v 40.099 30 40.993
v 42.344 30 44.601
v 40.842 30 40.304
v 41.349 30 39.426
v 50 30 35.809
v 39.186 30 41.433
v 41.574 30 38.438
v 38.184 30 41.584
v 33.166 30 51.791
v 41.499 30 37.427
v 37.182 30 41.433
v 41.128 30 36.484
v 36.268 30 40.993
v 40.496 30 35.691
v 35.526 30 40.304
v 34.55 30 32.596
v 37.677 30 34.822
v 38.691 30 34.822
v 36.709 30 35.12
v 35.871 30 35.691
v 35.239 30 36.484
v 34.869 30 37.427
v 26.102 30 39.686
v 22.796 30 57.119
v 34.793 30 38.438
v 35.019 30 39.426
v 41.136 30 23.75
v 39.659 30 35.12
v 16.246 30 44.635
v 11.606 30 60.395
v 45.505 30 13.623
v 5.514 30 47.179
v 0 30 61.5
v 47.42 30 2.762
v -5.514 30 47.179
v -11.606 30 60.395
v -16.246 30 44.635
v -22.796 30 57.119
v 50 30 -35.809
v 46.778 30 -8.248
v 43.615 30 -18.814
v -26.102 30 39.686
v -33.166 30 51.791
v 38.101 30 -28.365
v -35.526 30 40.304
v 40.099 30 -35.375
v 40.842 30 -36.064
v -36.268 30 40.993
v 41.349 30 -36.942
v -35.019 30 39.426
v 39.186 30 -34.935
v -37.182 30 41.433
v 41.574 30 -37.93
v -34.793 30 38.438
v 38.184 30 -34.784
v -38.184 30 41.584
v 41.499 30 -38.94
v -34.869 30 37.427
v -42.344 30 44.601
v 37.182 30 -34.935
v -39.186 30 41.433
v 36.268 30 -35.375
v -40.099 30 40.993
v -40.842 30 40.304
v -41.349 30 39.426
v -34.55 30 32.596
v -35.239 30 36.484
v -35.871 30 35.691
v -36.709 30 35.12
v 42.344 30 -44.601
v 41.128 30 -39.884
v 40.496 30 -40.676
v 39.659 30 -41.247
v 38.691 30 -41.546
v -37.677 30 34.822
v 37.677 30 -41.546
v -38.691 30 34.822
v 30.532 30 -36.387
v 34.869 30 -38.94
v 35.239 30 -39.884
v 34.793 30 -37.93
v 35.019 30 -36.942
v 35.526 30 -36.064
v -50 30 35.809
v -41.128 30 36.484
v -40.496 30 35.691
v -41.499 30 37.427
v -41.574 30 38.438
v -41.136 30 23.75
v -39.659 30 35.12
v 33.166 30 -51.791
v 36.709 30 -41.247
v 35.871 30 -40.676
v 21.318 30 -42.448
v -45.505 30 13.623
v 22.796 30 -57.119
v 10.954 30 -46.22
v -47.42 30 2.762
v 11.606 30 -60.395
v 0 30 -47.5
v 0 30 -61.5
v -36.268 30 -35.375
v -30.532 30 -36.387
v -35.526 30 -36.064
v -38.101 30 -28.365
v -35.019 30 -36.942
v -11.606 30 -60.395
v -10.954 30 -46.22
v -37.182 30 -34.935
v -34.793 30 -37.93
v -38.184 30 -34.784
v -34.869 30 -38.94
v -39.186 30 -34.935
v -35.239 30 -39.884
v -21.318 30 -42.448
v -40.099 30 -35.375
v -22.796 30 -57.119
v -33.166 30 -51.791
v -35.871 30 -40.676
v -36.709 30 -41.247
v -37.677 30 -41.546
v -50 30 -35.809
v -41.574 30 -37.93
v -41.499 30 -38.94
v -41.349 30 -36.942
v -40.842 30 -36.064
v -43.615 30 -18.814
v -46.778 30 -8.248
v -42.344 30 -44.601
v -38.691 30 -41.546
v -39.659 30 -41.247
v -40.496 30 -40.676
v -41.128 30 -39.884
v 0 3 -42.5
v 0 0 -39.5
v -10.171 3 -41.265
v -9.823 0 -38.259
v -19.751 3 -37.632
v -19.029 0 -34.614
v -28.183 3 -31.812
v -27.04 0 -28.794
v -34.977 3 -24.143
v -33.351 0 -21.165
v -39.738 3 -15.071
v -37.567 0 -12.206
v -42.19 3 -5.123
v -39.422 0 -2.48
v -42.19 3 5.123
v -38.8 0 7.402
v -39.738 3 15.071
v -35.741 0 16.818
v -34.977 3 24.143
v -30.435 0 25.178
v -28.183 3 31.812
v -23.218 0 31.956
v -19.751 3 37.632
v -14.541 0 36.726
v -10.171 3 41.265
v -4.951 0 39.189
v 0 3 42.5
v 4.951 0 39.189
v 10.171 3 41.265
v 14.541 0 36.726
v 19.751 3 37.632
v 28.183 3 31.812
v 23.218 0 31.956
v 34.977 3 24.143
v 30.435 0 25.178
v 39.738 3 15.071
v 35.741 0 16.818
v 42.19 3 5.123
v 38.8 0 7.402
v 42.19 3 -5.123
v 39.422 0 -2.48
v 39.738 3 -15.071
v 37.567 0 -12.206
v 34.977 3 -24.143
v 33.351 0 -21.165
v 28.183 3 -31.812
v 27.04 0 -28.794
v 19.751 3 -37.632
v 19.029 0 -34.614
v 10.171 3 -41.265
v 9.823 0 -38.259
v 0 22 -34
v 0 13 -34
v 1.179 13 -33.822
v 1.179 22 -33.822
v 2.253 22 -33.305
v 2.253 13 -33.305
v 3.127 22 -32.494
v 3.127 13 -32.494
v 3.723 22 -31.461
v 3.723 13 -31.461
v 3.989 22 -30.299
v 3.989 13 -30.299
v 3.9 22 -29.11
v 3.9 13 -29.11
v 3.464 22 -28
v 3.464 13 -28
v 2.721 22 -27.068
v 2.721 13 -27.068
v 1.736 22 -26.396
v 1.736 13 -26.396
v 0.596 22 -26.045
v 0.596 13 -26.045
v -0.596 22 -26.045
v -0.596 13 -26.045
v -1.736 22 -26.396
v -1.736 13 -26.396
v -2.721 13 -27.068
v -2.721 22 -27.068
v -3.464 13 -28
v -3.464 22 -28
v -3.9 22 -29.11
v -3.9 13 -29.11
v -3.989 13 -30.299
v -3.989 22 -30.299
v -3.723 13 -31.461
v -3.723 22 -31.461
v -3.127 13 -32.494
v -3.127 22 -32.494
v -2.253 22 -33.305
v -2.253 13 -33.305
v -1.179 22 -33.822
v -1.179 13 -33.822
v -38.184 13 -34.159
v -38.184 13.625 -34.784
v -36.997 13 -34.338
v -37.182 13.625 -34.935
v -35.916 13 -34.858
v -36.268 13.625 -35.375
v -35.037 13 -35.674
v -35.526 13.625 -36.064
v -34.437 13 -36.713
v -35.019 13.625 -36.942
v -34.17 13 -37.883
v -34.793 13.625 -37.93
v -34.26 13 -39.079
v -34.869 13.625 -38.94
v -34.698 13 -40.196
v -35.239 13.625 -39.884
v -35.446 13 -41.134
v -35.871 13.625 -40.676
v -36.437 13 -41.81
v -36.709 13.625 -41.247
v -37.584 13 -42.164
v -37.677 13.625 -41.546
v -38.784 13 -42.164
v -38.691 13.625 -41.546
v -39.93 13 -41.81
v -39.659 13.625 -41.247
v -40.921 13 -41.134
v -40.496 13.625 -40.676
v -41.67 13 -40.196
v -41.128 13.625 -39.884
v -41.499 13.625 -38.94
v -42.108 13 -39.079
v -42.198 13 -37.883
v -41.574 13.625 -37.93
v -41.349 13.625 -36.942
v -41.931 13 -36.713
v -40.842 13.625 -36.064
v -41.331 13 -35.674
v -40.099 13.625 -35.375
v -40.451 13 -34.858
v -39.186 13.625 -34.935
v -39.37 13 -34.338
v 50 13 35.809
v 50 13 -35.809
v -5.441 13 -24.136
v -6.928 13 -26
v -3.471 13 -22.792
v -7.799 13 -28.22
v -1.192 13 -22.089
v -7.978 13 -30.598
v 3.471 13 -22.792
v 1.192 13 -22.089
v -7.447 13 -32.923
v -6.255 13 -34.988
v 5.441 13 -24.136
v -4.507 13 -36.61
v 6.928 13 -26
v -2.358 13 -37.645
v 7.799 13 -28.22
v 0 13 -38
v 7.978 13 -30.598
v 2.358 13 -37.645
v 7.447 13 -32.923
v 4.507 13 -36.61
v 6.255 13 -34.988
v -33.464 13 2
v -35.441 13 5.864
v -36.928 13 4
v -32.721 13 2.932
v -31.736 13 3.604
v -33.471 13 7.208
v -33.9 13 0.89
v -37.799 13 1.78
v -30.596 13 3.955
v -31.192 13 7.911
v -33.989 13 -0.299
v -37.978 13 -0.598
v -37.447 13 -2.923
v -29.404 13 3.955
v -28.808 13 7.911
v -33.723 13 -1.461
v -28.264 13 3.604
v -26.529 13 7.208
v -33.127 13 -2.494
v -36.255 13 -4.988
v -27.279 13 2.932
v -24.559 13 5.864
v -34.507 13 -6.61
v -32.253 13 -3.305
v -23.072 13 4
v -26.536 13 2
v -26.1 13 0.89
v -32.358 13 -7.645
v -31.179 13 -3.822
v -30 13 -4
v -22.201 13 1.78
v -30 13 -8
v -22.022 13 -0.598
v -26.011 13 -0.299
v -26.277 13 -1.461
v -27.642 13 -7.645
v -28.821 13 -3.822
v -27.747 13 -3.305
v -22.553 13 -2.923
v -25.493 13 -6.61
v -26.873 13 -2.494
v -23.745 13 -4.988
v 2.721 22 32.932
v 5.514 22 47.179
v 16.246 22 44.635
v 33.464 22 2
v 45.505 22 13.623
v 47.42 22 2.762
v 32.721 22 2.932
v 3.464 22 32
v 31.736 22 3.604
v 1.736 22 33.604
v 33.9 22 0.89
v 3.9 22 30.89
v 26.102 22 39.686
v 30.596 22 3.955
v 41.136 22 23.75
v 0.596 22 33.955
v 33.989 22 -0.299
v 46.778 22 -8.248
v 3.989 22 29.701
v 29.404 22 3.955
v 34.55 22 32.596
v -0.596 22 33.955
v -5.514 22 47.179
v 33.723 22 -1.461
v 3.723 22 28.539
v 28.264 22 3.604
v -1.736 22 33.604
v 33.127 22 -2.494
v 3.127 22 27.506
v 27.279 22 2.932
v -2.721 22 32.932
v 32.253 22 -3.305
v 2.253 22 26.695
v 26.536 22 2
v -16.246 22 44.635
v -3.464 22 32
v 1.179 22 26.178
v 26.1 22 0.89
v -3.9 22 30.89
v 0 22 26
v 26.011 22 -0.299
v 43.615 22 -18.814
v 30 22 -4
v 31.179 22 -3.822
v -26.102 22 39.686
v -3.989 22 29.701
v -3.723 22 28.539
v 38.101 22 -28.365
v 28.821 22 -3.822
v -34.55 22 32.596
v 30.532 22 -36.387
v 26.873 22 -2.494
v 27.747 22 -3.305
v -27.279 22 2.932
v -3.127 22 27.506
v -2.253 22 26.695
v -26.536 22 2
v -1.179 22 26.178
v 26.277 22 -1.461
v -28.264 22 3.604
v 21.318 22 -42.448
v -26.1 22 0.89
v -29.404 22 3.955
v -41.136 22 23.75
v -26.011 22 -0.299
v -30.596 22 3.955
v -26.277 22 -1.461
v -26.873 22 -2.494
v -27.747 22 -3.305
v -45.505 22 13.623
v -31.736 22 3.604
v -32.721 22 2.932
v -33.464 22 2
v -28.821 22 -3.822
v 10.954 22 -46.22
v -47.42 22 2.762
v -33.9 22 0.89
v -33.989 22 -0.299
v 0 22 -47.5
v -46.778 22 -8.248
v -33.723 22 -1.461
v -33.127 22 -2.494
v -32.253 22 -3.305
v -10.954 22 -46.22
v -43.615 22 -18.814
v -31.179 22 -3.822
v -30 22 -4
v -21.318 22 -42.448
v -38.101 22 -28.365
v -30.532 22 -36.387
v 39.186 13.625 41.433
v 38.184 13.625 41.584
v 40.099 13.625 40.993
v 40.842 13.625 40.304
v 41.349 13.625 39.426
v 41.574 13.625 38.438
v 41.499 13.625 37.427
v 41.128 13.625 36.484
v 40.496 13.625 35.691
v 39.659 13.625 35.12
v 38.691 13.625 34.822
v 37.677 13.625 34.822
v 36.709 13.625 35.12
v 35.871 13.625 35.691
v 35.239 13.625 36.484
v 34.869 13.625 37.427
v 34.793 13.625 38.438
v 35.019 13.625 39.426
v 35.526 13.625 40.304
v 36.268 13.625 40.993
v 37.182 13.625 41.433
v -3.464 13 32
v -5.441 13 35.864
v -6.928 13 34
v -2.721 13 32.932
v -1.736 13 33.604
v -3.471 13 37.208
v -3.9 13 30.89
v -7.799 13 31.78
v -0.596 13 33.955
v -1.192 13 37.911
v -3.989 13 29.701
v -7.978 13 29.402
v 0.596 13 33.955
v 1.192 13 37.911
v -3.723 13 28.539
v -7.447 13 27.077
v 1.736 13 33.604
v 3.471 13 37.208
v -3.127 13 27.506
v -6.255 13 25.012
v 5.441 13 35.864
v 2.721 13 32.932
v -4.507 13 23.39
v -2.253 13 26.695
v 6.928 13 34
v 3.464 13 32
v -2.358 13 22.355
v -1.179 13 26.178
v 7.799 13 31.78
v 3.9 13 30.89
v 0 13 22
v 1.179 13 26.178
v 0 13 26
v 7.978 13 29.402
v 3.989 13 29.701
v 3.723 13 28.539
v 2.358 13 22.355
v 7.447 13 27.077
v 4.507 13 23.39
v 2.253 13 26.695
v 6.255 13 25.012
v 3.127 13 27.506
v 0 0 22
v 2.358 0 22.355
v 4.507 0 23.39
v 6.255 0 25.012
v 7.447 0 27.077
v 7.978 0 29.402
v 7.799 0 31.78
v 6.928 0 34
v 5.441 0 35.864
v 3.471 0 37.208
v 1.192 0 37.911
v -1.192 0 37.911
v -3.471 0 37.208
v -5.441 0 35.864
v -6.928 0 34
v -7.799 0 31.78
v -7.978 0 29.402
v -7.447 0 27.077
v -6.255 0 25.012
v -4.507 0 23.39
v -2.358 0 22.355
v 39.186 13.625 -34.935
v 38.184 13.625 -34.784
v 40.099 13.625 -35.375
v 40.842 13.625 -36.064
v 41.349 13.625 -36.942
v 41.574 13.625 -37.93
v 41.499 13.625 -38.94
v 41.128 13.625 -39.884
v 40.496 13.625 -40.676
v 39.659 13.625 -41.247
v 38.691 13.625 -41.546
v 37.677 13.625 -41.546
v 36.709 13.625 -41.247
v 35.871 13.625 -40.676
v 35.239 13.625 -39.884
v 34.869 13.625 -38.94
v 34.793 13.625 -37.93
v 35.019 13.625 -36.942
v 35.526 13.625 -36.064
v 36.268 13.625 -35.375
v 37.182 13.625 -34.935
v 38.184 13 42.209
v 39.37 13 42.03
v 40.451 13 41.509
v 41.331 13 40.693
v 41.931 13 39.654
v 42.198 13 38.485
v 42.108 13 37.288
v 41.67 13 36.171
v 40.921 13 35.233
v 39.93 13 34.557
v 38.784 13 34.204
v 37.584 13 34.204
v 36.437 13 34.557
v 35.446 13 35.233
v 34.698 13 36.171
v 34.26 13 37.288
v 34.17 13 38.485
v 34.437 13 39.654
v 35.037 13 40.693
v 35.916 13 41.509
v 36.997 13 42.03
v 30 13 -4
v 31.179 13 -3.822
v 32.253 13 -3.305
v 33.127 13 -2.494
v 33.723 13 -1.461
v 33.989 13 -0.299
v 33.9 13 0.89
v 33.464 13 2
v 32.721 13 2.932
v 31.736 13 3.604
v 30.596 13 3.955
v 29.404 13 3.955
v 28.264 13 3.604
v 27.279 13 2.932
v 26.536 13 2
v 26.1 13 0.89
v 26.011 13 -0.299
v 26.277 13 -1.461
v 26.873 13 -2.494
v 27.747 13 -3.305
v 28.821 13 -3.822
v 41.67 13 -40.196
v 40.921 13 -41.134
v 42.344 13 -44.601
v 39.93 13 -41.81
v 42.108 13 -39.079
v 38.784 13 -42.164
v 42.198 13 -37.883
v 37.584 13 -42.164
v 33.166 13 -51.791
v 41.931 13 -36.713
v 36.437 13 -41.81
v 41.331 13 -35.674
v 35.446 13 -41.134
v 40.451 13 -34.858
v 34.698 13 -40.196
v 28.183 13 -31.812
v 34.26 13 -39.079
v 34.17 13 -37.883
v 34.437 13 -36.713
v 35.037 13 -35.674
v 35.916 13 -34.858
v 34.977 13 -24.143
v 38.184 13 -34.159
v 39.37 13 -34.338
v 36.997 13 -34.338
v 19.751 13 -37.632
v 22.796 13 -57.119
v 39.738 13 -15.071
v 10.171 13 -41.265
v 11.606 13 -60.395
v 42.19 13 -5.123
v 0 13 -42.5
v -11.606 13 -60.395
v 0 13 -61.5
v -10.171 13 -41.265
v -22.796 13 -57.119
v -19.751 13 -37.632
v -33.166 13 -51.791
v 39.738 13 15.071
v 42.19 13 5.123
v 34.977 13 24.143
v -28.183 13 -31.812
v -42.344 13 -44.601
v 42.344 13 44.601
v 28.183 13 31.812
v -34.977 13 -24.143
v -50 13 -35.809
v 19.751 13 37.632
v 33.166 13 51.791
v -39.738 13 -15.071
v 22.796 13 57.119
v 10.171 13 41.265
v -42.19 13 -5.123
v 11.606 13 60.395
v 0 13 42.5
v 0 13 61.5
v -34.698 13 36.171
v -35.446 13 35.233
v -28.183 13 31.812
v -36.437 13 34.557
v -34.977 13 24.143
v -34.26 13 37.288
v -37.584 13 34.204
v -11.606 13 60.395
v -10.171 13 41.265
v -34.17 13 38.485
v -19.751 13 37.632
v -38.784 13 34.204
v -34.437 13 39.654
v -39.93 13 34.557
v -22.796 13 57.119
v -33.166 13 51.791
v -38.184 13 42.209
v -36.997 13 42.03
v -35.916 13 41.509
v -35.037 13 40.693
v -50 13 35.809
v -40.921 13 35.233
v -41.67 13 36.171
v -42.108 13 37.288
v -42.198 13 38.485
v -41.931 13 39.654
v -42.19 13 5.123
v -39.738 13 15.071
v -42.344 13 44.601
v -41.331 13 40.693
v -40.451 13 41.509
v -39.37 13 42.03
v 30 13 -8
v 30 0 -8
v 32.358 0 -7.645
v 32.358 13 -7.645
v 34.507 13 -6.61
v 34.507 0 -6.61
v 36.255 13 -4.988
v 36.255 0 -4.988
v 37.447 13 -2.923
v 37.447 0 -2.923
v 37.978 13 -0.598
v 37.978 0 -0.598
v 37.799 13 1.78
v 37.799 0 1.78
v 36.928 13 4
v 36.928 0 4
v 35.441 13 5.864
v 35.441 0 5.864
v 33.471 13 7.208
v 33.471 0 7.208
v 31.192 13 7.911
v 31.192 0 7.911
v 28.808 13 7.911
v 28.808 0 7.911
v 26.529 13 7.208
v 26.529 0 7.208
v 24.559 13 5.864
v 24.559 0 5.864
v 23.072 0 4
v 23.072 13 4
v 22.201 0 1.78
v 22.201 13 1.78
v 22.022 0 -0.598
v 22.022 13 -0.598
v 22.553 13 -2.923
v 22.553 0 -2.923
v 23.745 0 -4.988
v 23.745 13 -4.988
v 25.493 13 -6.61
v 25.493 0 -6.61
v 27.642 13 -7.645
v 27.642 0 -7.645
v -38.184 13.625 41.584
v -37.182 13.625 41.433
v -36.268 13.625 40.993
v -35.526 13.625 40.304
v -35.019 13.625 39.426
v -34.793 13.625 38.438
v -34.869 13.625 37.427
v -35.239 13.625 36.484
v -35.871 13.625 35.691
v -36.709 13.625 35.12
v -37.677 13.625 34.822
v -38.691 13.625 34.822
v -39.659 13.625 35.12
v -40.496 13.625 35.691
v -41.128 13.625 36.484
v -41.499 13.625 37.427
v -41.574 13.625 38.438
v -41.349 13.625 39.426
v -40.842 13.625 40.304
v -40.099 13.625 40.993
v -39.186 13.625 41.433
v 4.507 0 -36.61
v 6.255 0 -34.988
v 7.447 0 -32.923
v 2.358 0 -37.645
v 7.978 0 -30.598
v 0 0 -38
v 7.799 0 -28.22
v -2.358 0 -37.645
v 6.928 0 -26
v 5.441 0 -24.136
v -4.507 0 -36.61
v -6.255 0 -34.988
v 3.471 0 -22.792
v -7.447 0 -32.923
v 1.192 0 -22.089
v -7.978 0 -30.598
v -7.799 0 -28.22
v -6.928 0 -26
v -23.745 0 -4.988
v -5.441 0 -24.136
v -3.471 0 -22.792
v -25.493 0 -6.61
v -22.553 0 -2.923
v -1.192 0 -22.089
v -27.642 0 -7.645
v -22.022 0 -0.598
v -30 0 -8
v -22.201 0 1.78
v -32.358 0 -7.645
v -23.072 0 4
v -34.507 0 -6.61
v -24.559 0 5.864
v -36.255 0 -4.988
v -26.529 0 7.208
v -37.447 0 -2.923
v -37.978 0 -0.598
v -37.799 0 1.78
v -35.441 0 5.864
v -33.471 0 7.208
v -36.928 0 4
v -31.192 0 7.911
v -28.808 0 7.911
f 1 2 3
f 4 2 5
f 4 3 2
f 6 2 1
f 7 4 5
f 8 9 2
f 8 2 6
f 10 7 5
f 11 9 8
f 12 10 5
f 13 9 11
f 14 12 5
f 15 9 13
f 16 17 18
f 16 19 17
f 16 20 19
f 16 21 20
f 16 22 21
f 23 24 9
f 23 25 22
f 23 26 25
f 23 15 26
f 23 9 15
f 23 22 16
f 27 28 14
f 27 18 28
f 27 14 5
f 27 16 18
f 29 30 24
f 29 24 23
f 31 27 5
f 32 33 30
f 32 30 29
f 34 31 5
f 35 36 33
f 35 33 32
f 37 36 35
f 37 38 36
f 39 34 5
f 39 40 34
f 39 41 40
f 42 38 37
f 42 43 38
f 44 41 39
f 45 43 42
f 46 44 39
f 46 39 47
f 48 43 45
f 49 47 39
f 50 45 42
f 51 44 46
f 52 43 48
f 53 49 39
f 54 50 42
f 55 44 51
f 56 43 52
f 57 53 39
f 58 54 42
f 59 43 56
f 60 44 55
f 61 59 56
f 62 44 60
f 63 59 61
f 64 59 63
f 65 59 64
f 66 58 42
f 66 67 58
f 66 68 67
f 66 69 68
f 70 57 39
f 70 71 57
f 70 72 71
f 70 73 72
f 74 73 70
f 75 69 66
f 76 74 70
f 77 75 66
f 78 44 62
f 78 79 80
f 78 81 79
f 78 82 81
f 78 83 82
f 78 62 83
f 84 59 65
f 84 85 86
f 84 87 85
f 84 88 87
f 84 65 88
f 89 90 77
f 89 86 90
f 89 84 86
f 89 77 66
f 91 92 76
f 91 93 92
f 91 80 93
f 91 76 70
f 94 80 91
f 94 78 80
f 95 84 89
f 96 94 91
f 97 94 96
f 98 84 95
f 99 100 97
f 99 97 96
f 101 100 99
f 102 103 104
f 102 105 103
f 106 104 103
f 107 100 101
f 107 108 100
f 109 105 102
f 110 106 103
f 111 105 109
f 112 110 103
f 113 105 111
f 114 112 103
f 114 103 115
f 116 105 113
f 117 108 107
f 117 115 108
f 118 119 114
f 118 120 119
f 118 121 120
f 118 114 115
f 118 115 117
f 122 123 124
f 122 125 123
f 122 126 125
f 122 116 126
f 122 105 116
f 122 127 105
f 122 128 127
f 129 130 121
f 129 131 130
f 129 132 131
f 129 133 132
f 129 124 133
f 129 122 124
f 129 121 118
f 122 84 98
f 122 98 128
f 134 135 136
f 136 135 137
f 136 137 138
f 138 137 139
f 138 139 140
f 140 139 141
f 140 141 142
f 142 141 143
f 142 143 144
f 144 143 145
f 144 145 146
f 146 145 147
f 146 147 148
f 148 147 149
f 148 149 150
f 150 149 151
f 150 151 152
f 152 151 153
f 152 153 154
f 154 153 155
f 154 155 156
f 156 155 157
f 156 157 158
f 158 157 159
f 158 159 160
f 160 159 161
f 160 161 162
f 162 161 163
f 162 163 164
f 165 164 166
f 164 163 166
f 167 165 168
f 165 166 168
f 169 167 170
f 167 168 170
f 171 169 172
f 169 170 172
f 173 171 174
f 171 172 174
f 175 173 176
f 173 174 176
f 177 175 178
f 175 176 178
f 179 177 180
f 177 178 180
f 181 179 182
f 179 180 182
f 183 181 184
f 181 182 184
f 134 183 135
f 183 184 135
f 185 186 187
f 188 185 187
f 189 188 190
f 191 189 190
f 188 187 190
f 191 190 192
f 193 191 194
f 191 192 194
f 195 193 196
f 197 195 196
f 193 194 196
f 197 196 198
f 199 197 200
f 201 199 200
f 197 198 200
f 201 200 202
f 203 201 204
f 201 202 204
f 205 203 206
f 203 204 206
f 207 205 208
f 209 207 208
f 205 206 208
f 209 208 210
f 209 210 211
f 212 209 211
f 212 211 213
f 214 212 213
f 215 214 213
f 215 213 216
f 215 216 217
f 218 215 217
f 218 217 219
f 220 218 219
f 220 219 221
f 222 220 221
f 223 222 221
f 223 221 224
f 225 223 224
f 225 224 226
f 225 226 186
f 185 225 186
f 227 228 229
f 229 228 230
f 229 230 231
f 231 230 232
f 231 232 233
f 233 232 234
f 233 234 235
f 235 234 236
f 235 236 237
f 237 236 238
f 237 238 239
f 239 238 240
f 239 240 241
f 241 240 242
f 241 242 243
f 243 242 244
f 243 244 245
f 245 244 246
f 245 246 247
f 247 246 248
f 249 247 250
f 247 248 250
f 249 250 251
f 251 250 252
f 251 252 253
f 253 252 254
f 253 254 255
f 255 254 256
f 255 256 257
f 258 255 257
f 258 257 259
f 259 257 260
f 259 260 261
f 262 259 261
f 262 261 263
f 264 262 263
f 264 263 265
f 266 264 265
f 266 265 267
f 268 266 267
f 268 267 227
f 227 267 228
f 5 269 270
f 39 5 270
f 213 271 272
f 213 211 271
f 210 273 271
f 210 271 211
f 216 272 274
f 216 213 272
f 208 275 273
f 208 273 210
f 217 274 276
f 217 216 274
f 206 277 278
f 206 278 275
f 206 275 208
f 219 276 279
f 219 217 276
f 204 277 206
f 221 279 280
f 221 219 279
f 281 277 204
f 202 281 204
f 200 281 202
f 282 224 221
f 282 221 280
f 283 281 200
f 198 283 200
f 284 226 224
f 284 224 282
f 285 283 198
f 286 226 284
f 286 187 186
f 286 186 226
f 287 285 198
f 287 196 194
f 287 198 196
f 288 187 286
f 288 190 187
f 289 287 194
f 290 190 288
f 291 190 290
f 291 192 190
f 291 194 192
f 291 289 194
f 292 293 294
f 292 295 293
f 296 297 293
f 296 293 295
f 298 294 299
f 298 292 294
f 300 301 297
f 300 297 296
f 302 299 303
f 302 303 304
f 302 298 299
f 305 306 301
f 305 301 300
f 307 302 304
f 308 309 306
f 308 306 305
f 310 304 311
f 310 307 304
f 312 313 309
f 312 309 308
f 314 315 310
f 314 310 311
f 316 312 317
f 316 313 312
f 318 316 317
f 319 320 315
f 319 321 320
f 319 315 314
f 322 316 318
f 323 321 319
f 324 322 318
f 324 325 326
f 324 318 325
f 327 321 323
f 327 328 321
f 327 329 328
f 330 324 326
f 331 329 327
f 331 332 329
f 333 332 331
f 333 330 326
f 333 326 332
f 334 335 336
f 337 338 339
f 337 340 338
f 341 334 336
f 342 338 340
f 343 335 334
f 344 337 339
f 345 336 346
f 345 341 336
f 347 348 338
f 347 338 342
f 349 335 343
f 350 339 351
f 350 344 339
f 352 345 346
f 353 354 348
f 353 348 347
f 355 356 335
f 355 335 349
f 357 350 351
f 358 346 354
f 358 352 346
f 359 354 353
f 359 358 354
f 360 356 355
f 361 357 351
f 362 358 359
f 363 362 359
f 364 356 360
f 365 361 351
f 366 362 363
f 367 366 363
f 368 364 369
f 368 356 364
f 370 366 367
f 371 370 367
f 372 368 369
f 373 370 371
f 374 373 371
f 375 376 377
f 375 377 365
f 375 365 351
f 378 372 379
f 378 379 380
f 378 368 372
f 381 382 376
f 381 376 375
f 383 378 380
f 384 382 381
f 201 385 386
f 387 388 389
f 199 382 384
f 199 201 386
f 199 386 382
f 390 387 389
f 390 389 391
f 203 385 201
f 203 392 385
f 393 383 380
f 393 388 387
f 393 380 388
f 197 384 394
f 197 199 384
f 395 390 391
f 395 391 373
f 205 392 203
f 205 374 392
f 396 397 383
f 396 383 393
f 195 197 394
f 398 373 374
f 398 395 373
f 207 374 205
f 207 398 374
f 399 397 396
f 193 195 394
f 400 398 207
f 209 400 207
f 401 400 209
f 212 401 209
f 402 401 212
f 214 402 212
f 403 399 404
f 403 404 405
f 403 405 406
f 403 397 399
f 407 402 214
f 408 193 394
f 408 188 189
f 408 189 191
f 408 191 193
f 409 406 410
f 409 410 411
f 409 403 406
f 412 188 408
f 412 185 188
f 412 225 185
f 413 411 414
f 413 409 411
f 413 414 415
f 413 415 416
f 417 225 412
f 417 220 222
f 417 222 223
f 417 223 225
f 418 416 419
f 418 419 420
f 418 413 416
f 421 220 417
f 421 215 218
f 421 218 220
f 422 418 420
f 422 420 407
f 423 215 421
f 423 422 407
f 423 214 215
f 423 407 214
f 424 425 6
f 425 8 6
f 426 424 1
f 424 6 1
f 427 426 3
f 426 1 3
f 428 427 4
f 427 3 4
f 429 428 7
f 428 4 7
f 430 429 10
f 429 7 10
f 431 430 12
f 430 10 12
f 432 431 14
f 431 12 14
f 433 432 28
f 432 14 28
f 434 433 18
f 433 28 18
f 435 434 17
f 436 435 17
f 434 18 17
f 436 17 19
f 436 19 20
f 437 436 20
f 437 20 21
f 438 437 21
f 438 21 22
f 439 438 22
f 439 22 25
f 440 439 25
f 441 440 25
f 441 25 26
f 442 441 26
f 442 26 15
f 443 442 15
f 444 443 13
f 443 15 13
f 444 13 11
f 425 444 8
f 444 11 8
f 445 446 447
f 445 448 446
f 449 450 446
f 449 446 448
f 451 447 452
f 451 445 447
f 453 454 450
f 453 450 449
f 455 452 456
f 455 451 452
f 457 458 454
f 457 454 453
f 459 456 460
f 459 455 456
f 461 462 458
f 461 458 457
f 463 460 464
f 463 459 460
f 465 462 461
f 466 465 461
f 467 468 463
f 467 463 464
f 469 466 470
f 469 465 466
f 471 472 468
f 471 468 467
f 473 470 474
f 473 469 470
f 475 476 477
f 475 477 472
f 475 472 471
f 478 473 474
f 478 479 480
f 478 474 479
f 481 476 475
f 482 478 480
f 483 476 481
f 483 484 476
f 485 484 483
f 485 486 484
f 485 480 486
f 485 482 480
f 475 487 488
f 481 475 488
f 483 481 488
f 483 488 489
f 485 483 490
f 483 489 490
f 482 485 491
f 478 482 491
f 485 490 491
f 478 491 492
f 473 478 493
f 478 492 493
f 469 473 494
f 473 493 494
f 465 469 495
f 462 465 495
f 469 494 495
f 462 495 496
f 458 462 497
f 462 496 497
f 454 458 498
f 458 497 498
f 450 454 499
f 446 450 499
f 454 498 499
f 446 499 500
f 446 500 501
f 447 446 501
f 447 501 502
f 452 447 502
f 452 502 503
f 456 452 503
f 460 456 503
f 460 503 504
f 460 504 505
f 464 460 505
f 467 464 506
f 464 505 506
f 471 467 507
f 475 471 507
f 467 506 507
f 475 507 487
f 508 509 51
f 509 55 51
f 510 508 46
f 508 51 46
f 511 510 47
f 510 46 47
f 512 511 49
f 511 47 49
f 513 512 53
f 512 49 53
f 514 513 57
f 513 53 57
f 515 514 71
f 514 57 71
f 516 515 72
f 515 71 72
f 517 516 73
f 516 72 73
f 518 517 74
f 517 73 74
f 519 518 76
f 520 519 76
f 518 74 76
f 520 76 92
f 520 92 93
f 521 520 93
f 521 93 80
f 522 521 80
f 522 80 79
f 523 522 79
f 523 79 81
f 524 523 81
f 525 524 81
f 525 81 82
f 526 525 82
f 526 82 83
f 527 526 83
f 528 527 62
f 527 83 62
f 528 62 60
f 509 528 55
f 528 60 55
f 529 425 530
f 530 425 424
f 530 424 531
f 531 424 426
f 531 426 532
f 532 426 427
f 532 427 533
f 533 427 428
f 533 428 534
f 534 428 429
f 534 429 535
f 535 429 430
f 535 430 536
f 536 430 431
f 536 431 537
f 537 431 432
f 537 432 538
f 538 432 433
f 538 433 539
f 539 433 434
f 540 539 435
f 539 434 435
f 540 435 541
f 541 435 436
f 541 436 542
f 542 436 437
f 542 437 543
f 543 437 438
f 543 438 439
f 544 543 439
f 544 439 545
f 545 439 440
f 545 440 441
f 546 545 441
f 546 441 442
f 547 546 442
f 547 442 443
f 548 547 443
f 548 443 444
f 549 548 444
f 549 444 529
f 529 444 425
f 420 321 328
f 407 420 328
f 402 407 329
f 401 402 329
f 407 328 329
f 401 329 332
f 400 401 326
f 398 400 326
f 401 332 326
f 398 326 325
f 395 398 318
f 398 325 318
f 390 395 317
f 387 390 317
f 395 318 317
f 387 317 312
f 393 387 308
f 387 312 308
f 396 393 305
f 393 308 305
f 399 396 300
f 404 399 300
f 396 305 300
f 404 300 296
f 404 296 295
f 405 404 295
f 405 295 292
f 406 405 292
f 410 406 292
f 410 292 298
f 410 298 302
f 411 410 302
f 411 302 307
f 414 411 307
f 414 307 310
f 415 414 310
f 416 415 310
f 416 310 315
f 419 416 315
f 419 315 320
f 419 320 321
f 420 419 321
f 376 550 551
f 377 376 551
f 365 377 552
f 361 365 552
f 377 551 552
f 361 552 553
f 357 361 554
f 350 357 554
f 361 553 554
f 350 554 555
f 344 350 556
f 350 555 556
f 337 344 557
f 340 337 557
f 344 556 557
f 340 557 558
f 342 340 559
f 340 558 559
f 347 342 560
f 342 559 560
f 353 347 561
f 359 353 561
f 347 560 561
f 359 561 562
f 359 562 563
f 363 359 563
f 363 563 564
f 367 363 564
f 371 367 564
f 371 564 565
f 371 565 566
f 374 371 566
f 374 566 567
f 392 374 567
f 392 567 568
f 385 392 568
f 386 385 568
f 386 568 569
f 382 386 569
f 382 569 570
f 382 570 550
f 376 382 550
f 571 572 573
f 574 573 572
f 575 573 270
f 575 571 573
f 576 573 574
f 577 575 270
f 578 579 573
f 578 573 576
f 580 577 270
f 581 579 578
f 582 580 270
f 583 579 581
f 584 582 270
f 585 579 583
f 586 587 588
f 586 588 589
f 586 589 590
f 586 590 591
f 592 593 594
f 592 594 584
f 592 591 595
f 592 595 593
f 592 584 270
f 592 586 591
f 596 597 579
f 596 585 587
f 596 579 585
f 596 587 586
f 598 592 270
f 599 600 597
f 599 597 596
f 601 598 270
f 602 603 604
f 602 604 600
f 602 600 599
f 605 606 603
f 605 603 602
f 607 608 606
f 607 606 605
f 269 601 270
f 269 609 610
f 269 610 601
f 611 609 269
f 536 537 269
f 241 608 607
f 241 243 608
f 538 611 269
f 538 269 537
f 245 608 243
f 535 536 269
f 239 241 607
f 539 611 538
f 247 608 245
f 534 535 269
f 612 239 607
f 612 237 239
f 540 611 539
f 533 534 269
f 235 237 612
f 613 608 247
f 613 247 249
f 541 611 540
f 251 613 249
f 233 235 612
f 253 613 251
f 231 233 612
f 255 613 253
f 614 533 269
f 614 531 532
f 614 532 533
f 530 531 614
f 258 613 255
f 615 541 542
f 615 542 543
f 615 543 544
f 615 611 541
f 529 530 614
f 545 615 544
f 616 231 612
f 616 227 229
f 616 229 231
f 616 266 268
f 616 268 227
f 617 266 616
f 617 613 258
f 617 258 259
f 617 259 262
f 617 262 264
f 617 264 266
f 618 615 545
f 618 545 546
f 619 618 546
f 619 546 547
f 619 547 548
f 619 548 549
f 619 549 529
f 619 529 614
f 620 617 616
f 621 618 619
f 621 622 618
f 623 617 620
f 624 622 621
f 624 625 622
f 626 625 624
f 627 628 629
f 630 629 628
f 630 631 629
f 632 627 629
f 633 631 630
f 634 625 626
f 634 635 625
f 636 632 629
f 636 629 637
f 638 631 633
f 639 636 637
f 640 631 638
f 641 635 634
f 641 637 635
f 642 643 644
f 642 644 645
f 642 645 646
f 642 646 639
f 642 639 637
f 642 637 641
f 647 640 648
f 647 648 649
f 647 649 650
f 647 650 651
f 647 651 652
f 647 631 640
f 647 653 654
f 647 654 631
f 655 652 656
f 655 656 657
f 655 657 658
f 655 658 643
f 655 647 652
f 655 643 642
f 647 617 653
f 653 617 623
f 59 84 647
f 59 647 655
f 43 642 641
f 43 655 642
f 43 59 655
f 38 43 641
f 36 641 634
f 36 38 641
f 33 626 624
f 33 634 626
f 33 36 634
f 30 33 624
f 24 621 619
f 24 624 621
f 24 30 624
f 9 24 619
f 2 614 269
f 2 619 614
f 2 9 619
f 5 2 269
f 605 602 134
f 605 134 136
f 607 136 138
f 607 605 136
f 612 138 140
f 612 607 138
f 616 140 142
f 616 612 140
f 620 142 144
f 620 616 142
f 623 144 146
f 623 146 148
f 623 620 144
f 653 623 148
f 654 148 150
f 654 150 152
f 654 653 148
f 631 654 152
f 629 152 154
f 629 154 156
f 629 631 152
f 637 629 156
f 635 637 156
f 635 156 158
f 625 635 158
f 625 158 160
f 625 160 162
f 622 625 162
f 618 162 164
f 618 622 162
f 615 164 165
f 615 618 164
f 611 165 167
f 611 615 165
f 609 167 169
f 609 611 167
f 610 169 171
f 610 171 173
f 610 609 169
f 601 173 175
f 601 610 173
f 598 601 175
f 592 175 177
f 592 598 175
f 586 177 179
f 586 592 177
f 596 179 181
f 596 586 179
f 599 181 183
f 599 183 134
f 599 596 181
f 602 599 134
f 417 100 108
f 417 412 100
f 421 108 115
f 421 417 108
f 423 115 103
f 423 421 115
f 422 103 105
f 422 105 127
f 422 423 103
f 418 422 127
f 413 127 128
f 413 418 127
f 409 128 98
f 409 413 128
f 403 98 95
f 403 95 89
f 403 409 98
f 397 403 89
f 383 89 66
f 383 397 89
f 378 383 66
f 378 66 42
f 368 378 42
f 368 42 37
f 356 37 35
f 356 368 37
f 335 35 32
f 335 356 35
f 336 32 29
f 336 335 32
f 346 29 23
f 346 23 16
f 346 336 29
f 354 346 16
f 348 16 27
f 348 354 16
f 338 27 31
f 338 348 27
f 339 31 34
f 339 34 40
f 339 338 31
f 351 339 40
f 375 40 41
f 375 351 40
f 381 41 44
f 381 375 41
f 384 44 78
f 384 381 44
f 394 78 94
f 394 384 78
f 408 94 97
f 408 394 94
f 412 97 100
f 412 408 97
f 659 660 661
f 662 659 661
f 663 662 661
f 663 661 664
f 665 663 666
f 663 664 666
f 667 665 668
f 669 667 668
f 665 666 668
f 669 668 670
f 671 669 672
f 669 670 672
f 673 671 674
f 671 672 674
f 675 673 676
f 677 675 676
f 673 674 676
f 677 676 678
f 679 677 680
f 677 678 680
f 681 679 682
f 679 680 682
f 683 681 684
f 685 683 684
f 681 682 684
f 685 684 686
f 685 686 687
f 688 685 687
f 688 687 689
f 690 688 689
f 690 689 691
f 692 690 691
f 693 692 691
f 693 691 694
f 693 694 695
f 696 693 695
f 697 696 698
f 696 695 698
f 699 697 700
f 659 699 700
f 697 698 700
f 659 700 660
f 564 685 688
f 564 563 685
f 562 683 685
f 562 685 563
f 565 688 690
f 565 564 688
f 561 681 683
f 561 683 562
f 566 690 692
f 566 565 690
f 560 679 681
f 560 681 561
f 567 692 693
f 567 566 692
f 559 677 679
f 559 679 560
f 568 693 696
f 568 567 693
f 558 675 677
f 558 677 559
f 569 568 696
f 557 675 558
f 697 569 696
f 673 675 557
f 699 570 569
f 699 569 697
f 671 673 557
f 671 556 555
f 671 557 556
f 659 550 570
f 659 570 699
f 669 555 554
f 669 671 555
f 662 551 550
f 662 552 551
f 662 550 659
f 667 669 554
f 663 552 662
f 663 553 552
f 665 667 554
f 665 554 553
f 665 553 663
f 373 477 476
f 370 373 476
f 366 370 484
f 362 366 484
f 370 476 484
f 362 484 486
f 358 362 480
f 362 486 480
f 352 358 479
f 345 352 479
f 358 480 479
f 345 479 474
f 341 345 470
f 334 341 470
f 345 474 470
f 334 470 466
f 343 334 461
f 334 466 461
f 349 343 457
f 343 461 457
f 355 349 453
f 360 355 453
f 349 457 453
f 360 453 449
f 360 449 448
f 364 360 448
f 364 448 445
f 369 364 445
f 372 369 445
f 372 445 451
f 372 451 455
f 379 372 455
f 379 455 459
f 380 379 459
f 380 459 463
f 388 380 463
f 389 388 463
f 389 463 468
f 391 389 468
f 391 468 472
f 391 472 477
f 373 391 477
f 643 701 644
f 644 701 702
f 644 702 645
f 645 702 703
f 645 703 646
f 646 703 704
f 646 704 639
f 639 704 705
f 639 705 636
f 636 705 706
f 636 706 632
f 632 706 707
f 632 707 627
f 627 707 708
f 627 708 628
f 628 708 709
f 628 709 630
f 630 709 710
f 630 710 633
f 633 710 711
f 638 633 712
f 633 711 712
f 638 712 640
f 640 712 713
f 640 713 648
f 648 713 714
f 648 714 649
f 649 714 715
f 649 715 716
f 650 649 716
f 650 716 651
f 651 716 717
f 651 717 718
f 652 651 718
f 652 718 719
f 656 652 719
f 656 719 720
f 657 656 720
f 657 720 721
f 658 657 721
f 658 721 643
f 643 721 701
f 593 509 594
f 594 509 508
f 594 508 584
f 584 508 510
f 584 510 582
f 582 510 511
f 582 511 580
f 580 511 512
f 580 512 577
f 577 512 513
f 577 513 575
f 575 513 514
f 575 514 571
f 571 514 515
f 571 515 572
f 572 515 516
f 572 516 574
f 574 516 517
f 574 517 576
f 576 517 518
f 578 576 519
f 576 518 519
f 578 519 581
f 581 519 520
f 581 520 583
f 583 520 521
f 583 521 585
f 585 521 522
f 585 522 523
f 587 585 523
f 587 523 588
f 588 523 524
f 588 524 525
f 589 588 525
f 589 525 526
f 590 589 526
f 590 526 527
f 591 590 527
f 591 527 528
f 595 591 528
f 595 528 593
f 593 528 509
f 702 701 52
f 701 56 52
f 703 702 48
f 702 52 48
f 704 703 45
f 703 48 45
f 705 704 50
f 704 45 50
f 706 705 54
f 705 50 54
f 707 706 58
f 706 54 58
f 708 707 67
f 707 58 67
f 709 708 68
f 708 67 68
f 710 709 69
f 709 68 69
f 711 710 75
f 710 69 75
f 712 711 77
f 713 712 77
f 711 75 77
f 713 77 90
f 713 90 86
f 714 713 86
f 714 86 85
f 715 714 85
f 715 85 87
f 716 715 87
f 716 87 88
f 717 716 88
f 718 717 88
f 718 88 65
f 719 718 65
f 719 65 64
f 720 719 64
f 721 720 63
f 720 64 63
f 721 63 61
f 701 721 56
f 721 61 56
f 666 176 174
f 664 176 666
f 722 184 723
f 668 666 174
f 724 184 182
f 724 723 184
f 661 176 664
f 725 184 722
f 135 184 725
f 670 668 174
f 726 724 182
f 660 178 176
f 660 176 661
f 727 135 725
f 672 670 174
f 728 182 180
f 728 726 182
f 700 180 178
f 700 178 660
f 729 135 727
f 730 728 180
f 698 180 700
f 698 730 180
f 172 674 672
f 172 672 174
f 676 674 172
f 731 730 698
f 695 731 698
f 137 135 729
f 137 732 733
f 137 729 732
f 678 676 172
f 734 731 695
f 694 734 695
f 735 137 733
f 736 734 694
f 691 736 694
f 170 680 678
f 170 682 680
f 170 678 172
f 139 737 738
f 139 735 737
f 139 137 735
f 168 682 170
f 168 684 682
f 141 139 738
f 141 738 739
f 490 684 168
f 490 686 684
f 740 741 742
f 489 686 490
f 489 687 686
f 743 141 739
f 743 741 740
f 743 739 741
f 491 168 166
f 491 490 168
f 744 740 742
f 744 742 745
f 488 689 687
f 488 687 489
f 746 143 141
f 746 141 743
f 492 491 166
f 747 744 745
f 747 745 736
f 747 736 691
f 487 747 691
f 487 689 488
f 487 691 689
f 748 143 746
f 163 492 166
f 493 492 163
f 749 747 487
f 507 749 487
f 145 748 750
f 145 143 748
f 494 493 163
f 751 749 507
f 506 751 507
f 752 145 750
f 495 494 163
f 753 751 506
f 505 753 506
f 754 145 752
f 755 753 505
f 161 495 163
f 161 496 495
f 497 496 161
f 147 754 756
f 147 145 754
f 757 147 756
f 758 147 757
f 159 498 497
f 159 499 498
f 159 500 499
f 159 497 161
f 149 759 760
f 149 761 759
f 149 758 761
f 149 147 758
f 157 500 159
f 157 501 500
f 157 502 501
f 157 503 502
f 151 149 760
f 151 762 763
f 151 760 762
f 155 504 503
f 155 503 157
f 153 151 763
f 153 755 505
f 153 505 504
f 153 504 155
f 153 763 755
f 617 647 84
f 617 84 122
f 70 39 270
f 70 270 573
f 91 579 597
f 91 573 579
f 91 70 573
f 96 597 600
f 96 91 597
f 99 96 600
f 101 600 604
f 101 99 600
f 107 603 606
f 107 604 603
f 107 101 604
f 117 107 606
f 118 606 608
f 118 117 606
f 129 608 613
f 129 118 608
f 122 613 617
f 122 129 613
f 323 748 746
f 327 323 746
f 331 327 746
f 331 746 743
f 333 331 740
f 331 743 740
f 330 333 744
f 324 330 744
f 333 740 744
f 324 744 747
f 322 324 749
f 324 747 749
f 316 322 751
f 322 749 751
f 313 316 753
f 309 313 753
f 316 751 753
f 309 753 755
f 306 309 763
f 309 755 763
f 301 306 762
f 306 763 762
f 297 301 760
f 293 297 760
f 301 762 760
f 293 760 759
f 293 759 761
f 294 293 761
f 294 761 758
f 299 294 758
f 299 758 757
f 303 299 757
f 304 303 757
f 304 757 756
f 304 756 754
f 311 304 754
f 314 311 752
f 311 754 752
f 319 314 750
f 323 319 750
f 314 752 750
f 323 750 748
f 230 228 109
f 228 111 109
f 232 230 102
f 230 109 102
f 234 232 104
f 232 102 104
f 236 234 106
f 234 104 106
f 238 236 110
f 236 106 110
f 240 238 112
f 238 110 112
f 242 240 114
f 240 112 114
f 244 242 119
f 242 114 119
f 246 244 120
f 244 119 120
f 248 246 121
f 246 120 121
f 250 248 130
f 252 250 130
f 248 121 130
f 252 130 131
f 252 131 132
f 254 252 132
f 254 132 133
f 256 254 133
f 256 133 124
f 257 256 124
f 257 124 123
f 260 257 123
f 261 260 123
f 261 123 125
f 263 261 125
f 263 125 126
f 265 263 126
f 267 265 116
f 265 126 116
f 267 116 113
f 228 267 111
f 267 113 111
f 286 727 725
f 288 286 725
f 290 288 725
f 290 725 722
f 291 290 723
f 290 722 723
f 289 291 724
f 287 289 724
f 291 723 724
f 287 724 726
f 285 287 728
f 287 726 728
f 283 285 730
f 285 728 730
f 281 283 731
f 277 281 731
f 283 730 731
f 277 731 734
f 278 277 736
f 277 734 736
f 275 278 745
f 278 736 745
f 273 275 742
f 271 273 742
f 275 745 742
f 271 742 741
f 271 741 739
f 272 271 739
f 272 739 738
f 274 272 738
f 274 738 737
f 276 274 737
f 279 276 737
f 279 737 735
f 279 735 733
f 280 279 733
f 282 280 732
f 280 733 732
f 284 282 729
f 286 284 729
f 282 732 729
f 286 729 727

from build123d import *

# Parameters (mm, degrees)
CUT_EXTRUDE3_START          = -17
SKETCH4_OUTSIDE_W           = 160.304
SKETCH4_OUTSIDE_H           = 160.304
SKETCH4_OUTSIDE_W_2         = 100
SKETCH4_OUTSIDE_H_2         = 123
CUT_EXTRUDE3_DEPTH          = 17
CUT_EXTRUDE4_REACH          = 86.748
SKETCH5_R                   = 2.5
SKETCH2_R                   = 4
CUT_EXTRUDE5_DEPTH          = 85.748156322
SKETCH6_R                   = 8
CUT_EXTRUDE6_DEPTH          = 13
CHAMFER1_SIZE               = 3
M8_TAPPED_HOLE1_D           = 6.8
M8_TAPPED_HOLE1_DEPTH       = 19.75
M8_TAPPED_HOLE1_CSINK_D     = 8.05
M8_TAPPED_HOLE1_CSINK_ANGLE = 90
M8_TAPPED_HOLE1_TIP         = 2.042926105


with BuildPart() as part:
    # Sketch1 → Revolve1 (revolve)
    with BuildSketch(Plane.XY, mode=Mode.PRIVATE) as revolve1_sk:
        Polygon((42.5, 0), (42.5, 13), (61.5, 13), (61.5, 30), (47.5, 30), (47.5, 22), (0, 22), (0, 0), align=None)
    revolve(revolve1_sk.sketch.rotate(Axis((0, 0, 0), (0, 1, 0)), 90), axis=Axis((0, 0, 0), (0, 1, 0)))

    # Sketch4 outside → Cut-Extrude3 (cut)
    with BuildSketch(Plane(origin=(0, 30, 0), x_dir=(1, 0, 0), z_dir=(0, 1, 0)).offset(CUT_EXTRUDE3_START)):
        Rectangle(SKETCH4_OUTSIDE_W, SKETCH4_OUTSIDE_H)
        Rectangle(SKETCH4_OUTSIDE_W_2, SKETCH4_OUTSIDE_H_2, mode=Mode.SUBTRACT)
    extrude(amount=CUT_EXTRUDE3_DEPTH, mode=Mode.SUBTRACT)

    # Sketch5 → Cut-Extrude4 (cut, up to next)
    with BuildSketch(Plane(origin=(0, 30, 0), x_dir=(1, 0, 0), z_dir=(0, 1, 0)), mode=Mode.PRIVATE) as cut_extrude4_sk1:
        with Locations(Location((-38.183766184, 38.183766184, 0), (0, 0, 270))):
            Circle(SKETCH5_R)
    cut_extrude4_tool1 = extrude(cut_extrude4_sk1.sketch, amount=-CUT_EXTRUDE4_REACH, mode=Mode.PRIVATE) & part.part
    # Sketch5 → Cut-Extrude4 (cut, up to next)
    with BuildSketch(Plane(origin=(0, 30, 0), x_dir=(1, 0, 0), z_dir=(0, 1, 0)), mode=Mode.PRIVATE) as cut_extrude4_sk2:
        with Locations(Location((38.183766184, 38.183766184, 0), (0, 0, 270))):
            Circle(SKETCH5_R)
    cut_extrude4_tool2 = extrude(cut_extrude4_sk2.sketch, amount=-CUT_EXTRUDE4_REACH, mode=Mode.PRIVATE) & part.part
    # Sketch5 → Cut-Extrude4 (cut, up to next)
    with BuildSketch(Plane(origin=(0, 30, 0), x_dir=(1, 0, 0), z_dir=(0, 1, 0)), mode=Mode.PRIVATE) as cut_extrude4_sk3:
        with Locations(Location((38.183766184, -38.183766184, 0), (0, 0, 270))):
            Circle(SKETCH5_R)
    cut_extrude4_tool3 = extrude(cut_extrude4_sk3.sketch, amount=-CUT_EXTRUDE4_REACH, mode=Mode.PRIVATE) & part.part
    # Sketch5 → Cut-Extrude4 (cut, up to next)
    with BuildSketch(Plane(origin=(0, 30, 0), x_dir=(1, 0, 0), z_dir=(0, 1, 0)), mode=Mode.PRIVATE) as cut_extrude4_sk4:
        with Locations(Location((-38.183766184, -38.183766184, 0), (0, 0, 270))):
            Circle(SKETCH5_R)
    cut_extrude4_tool4 = extrude(cut_extrude4_sk4.sketch, amount=-CUT_EXTRUDE4_REACH, mode=Mode.PRIVATE) & part.part
    add(cut_extrude4_tool1.solids().sort_by_distance((-38.183766, 30, -38.183766))[0], mode=Mode.SUBTRACT)
    add(cut_extrude4_tool2.solids().sort_by_distance((38.183766, 30, -38.183766))[0], mode=Mode.SUBTRACT)
    add(cut_extrude4_tool3.solids().sort_by_distance((38.183766, 30, 38.183766))[0], mode=Mode.SUBTRACT)
    add(cut_extrude4_tool4.solids().sort_by_distance((-38.183766, 30, 38.183766))[0], mode=Mode.SUBTRACT)

    # Sketch2 → Cut-Extrude5 (cut, through all)
    with BuildSketch(Plane.XZ):
        with Locations(Location((30, 0, 0), (0, 0, 270))):
            Circle(SKETCH2_R)
        with Locations(Location((0, -30, 0), (0, 0, 270))):
            Circle(SKETCH2_R)
        with Locations(Location((-30, 0, 0), (0, 0, 270))):
            Circle(SKETCH2_R)
        with Locations(Location((0, 30, 0), (0, 0, 270))):
            Circle(SKETCH2_R)
    extrude(amount=-CUT_EXTRUDE5_DEPTH, mode=Mode.SUBTRACT)

    # Sketch6 → Cut-Extrude6 (cut)
    with BuildSketch(Plane.XZ):
        with Locations(Location((0, 30, 0), (0, 0, 270))):
            Circle(SKETCH6_R)
        with Locations(Location((30, 0, 0), (0, 0, 270))):
            Circle(SKETCH6_R)
        with Locations(Location((-30, 0, 0), (0, 0, 270))):
            Circle(SKETCH6_R)
        with Locations(Location((0, -30, 0), (0, 0, 270))):
            Circle(SKETCH6_R)
    extrude(amount=-CUT_EXTRUDE6_DEPTH, mode=Mode.SUBTRACT)

    # Chamfer1
    chamfer1_edges = [part.edges().sort_by_distance(p)[0] for p in [
        (0, 0, 42.5),
    ]]
    chamfer(chamfer1_edges, length=CHAMFER1_SIZE)

    # M8 Tapped Hole1
    with Locations(Plane(origin=(38.183766184, 13, -38.183766184), x_dir=(0, 0, -1), z_dir=(0, -1, 0))):
        with Locations((0, 0), (0, -76.367532368), (-76.367532368, -76.367532368), (-76.367532368, 0)):
            CounterSinkHole(M8_TAPPED_HOLE1_D / 2, M8_TAPPED_HOLE1_CSINK_D / 2, depth=M8_TAPPED_HOLE1_DEPTH, counter_sink_angle=M8_TAPPED_HOLE1_CSINK_ANGLE)
            with Locations((0, 0, -(M8_TAPPED_HOLE1_DEPTH + M8_TAPPED_HOLE1_TIP / 2))):  # 118° drill point
                Cone(0, M8_TAPPED_HOLE1_D / 2, M8_TAPPED_HOLE1_TIP, mode=Mode.SUBTRACT)


solid = part.part
